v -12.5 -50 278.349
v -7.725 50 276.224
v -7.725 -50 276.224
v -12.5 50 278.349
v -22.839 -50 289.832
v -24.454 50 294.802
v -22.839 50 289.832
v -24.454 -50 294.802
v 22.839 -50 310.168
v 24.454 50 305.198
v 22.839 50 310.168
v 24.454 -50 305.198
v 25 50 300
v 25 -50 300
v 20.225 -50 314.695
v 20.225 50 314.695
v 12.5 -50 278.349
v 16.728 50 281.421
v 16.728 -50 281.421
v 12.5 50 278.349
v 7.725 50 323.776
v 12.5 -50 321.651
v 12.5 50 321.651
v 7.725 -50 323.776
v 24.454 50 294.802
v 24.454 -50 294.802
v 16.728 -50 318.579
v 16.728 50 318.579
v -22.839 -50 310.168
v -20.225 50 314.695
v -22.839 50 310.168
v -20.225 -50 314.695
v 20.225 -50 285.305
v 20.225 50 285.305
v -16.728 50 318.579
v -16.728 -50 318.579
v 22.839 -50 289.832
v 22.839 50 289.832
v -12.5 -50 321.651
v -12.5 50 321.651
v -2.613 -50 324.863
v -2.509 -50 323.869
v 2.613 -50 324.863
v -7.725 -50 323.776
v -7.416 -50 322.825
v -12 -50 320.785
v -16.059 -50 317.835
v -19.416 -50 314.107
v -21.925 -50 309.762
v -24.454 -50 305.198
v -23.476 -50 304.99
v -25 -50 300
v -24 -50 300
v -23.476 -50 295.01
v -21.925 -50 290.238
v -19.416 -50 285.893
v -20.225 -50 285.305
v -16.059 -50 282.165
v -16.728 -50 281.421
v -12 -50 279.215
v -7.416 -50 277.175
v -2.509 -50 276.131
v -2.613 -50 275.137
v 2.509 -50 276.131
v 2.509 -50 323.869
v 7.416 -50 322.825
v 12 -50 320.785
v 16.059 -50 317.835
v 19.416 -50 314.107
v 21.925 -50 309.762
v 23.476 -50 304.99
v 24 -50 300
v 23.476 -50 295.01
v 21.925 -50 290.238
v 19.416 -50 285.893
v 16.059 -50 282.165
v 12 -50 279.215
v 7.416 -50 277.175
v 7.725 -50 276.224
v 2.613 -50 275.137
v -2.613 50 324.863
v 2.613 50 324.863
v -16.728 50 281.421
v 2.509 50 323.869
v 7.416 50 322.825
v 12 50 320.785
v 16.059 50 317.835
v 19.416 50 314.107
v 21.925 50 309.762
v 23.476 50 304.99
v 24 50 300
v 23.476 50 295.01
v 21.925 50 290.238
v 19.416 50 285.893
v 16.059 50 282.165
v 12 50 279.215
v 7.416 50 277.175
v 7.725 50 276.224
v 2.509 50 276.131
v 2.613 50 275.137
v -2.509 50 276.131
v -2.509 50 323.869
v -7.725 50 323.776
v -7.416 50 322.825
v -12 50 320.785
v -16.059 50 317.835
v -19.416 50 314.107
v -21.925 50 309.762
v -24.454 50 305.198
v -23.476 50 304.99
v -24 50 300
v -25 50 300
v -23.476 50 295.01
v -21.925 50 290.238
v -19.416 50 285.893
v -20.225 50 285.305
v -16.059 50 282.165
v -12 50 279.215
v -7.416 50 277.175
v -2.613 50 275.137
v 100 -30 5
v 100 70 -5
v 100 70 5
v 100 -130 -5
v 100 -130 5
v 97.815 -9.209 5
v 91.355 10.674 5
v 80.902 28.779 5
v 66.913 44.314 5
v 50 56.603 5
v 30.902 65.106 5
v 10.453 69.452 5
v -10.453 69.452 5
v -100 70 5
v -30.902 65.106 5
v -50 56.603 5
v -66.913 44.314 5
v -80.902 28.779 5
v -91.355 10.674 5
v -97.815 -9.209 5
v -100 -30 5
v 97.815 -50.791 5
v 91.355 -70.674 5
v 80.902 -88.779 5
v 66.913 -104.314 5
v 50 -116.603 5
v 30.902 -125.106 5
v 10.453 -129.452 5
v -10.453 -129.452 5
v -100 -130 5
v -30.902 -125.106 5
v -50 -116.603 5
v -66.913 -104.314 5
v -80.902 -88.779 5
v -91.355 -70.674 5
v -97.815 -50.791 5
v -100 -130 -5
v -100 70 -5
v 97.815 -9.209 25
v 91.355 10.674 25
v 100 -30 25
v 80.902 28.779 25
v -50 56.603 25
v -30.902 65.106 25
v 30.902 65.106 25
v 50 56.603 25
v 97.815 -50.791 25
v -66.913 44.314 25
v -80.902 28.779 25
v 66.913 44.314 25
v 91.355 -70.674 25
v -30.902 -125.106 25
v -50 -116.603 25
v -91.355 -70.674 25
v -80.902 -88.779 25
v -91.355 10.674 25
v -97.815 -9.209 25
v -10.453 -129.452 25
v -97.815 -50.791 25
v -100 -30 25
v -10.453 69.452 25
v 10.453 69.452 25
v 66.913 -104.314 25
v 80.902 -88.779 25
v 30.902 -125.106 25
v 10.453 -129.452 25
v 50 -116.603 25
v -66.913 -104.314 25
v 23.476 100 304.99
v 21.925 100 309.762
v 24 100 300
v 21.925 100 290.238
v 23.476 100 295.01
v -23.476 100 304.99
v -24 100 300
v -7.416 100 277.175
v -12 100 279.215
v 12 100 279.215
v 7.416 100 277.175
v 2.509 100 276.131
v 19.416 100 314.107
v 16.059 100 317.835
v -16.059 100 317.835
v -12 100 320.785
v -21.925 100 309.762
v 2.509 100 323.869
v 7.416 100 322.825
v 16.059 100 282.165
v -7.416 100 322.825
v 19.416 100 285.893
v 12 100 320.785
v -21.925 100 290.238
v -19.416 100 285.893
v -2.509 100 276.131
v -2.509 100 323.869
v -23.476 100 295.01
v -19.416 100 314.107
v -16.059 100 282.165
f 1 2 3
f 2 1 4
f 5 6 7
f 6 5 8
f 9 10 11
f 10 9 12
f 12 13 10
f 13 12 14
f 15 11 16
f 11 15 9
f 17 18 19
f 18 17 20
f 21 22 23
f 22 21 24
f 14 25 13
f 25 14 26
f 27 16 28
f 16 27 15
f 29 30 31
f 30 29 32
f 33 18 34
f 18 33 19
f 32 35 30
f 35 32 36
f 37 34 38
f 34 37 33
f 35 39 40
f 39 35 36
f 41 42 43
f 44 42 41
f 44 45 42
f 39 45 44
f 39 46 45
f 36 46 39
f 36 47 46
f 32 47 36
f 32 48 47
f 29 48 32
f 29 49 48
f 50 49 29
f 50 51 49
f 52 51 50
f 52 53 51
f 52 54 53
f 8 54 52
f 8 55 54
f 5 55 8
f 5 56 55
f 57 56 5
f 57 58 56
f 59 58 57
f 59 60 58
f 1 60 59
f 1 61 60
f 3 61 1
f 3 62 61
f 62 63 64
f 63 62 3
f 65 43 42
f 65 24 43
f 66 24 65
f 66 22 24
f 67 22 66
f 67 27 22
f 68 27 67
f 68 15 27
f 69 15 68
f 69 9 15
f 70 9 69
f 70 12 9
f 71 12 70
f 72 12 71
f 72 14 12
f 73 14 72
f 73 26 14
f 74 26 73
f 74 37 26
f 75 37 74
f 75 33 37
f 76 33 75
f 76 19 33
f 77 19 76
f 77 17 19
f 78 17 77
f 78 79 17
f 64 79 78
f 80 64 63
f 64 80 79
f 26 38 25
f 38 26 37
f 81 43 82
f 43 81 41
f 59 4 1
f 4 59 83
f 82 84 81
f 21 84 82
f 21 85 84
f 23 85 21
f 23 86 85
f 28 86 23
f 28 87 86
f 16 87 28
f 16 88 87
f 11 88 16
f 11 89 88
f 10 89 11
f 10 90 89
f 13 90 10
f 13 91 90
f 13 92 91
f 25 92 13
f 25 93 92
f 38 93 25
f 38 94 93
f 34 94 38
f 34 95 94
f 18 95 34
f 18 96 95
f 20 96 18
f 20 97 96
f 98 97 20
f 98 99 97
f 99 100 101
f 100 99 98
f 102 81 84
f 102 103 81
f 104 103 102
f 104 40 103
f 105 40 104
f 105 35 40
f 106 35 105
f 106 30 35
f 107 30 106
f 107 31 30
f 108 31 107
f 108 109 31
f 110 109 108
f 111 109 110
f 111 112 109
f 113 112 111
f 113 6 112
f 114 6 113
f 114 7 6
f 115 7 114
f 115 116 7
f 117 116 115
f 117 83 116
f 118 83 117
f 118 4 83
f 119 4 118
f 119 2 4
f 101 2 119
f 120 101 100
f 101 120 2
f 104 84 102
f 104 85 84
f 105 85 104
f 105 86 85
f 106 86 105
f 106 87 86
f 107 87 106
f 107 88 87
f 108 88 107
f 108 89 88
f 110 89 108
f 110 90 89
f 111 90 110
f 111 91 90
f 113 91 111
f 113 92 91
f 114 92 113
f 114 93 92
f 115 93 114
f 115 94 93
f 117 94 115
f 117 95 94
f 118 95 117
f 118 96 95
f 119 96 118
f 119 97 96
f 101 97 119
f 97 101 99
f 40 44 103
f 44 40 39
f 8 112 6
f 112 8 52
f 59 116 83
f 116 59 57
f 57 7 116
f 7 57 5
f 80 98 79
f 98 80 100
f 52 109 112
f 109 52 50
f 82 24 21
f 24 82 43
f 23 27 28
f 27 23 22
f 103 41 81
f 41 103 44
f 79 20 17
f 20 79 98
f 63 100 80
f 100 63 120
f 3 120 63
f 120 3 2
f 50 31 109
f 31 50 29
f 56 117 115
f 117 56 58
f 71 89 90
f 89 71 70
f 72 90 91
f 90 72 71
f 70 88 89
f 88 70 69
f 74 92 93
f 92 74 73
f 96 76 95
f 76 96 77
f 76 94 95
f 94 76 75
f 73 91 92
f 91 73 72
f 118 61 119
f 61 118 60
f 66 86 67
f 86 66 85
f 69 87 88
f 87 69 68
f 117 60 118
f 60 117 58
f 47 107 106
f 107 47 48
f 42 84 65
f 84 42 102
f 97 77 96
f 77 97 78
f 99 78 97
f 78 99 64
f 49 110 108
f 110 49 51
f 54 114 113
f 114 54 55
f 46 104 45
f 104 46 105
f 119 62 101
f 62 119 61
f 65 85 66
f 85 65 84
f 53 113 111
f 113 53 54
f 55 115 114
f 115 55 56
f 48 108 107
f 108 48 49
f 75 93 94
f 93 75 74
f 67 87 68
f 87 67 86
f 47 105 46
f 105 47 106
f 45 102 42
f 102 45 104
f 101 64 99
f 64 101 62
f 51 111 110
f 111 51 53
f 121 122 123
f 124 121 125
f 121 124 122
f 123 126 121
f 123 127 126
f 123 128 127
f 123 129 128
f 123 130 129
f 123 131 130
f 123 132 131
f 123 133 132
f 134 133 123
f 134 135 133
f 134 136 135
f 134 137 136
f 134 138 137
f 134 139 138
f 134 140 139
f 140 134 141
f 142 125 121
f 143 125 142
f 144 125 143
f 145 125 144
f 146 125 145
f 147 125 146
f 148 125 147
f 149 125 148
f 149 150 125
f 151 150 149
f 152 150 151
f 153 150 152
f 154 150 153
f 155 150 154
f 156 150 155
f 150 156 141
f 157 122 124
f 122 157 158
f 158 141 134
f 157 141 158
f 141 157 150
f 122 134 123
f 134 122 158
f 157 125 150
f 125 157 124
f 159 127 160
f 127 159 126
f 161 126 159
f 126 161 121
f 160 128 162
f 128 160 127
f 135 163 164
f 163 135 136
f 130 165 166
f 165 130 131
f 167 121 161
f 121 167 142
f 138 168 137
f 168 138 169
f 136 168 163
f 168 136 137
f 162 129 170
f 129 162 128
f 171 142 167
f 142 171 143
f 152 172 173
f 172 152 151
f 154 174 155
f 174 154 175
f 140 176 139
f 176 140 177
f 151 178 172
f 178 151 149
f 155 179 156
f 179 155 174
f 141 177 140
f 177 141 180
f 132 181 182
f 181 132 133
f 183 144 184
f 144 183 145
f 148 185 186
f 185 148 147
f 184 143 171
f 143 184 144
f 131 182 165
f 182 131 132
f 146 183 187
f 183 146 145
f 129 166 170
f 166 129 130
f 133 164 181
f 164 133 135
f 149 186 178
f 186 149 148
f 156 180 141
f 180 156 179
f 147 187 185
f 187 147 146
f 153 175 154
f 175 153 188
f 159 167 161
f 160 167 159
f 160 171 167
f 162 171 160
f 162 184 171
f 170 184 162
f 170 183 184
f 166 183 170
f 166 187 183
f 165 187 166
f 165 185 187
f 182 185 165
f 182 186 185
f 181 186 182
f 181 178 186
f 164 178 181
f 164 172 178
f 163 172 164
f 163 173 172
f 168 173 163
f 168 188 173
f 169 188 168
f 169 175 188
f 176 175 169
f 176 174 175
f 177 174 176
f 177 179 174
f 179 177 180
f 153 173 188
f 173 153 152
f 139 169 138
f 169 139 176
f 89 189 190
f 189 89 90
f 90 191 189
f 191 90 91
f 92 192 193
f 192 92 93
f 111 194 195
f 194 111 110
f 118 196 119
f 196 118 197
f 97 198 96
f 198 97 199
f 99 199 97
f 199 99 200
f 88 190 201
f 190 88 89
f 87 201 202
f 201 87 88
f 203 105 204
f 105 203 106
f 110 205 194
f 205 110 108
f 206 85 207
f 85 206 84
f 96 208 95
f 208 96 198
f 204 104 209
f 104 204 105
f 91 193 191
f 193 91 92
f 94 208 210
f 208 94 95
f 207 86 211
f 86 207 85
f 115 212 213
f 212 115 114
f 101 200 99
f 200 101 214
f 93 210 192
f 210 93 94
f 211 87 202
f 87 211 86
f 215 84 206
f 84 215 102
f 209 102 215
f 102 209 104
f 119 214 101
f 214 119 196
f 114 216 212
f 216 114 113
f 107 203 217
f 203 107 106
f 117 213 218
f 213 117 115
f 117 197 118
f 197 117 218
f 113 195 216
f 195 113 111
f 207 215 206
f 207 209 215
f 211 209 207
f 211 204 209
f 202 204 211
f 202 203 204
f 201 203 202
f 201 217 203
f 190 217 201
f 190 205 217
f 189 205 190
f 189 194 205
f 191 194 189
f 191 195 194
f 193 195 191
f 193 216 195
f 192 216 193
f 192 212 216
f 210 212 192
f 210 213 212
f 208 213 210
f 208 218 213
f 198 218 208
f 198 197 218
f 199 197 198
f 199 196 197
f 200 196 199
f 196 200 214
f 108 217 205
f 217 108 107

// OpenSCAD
//With boolean operations, we need to extend the size of the shape that is 
//doing the subtracting in order to avoid the screen door effect. 
//This is the amount that those parts are extended. 
boolean_ext=1.0;

//Parameters
output_tube_length=100;
output_tube_diameter=50;

motor_height=50;
motor_diameter=48;

hopper_diameter=200;
hopper_taper_diameter=40;
hopper_taper_height=100;
hopper_top_height=200;

burner_base_width=200;
burner_base_depth=200;
burner_base_height=20;

beans_pot_diameter=200;

//colors
output_tube_color=([1.0, 0.5, 1.0]);
burner_color=([1.0, 0.5, 0.5]);
motor_color=([1.0, 1.0, 1.0]);


//hopper


//output tube
color(output_tube_color)
translate([0, 0, 300])
rotate([90, 0, 0]) 
{
	difference()
	{		 
		cylinder(r=output_tube_diameter/2, h=output_tube_length, center=true);
		cylinder(r=24, h=output_tube_length+boolean_ext, center=true);
	}
}

//motor
color([0.5, 0.5, 1.0])
translate([0, output_tube_length/2+motor_height/2, 300])
rotate([90, 0, 0])
cylinder(r=motor_diameter/2, h=motor_height, center=true);

//burner
color([1.0, 0.2, 0.2])
translate([0, -30, 0])
{
 cube([200, 200, 10], center=true);
 translate([0, 0, 15])
 cylinder(r=100, h=20, center=true);
}

//rice cooker
